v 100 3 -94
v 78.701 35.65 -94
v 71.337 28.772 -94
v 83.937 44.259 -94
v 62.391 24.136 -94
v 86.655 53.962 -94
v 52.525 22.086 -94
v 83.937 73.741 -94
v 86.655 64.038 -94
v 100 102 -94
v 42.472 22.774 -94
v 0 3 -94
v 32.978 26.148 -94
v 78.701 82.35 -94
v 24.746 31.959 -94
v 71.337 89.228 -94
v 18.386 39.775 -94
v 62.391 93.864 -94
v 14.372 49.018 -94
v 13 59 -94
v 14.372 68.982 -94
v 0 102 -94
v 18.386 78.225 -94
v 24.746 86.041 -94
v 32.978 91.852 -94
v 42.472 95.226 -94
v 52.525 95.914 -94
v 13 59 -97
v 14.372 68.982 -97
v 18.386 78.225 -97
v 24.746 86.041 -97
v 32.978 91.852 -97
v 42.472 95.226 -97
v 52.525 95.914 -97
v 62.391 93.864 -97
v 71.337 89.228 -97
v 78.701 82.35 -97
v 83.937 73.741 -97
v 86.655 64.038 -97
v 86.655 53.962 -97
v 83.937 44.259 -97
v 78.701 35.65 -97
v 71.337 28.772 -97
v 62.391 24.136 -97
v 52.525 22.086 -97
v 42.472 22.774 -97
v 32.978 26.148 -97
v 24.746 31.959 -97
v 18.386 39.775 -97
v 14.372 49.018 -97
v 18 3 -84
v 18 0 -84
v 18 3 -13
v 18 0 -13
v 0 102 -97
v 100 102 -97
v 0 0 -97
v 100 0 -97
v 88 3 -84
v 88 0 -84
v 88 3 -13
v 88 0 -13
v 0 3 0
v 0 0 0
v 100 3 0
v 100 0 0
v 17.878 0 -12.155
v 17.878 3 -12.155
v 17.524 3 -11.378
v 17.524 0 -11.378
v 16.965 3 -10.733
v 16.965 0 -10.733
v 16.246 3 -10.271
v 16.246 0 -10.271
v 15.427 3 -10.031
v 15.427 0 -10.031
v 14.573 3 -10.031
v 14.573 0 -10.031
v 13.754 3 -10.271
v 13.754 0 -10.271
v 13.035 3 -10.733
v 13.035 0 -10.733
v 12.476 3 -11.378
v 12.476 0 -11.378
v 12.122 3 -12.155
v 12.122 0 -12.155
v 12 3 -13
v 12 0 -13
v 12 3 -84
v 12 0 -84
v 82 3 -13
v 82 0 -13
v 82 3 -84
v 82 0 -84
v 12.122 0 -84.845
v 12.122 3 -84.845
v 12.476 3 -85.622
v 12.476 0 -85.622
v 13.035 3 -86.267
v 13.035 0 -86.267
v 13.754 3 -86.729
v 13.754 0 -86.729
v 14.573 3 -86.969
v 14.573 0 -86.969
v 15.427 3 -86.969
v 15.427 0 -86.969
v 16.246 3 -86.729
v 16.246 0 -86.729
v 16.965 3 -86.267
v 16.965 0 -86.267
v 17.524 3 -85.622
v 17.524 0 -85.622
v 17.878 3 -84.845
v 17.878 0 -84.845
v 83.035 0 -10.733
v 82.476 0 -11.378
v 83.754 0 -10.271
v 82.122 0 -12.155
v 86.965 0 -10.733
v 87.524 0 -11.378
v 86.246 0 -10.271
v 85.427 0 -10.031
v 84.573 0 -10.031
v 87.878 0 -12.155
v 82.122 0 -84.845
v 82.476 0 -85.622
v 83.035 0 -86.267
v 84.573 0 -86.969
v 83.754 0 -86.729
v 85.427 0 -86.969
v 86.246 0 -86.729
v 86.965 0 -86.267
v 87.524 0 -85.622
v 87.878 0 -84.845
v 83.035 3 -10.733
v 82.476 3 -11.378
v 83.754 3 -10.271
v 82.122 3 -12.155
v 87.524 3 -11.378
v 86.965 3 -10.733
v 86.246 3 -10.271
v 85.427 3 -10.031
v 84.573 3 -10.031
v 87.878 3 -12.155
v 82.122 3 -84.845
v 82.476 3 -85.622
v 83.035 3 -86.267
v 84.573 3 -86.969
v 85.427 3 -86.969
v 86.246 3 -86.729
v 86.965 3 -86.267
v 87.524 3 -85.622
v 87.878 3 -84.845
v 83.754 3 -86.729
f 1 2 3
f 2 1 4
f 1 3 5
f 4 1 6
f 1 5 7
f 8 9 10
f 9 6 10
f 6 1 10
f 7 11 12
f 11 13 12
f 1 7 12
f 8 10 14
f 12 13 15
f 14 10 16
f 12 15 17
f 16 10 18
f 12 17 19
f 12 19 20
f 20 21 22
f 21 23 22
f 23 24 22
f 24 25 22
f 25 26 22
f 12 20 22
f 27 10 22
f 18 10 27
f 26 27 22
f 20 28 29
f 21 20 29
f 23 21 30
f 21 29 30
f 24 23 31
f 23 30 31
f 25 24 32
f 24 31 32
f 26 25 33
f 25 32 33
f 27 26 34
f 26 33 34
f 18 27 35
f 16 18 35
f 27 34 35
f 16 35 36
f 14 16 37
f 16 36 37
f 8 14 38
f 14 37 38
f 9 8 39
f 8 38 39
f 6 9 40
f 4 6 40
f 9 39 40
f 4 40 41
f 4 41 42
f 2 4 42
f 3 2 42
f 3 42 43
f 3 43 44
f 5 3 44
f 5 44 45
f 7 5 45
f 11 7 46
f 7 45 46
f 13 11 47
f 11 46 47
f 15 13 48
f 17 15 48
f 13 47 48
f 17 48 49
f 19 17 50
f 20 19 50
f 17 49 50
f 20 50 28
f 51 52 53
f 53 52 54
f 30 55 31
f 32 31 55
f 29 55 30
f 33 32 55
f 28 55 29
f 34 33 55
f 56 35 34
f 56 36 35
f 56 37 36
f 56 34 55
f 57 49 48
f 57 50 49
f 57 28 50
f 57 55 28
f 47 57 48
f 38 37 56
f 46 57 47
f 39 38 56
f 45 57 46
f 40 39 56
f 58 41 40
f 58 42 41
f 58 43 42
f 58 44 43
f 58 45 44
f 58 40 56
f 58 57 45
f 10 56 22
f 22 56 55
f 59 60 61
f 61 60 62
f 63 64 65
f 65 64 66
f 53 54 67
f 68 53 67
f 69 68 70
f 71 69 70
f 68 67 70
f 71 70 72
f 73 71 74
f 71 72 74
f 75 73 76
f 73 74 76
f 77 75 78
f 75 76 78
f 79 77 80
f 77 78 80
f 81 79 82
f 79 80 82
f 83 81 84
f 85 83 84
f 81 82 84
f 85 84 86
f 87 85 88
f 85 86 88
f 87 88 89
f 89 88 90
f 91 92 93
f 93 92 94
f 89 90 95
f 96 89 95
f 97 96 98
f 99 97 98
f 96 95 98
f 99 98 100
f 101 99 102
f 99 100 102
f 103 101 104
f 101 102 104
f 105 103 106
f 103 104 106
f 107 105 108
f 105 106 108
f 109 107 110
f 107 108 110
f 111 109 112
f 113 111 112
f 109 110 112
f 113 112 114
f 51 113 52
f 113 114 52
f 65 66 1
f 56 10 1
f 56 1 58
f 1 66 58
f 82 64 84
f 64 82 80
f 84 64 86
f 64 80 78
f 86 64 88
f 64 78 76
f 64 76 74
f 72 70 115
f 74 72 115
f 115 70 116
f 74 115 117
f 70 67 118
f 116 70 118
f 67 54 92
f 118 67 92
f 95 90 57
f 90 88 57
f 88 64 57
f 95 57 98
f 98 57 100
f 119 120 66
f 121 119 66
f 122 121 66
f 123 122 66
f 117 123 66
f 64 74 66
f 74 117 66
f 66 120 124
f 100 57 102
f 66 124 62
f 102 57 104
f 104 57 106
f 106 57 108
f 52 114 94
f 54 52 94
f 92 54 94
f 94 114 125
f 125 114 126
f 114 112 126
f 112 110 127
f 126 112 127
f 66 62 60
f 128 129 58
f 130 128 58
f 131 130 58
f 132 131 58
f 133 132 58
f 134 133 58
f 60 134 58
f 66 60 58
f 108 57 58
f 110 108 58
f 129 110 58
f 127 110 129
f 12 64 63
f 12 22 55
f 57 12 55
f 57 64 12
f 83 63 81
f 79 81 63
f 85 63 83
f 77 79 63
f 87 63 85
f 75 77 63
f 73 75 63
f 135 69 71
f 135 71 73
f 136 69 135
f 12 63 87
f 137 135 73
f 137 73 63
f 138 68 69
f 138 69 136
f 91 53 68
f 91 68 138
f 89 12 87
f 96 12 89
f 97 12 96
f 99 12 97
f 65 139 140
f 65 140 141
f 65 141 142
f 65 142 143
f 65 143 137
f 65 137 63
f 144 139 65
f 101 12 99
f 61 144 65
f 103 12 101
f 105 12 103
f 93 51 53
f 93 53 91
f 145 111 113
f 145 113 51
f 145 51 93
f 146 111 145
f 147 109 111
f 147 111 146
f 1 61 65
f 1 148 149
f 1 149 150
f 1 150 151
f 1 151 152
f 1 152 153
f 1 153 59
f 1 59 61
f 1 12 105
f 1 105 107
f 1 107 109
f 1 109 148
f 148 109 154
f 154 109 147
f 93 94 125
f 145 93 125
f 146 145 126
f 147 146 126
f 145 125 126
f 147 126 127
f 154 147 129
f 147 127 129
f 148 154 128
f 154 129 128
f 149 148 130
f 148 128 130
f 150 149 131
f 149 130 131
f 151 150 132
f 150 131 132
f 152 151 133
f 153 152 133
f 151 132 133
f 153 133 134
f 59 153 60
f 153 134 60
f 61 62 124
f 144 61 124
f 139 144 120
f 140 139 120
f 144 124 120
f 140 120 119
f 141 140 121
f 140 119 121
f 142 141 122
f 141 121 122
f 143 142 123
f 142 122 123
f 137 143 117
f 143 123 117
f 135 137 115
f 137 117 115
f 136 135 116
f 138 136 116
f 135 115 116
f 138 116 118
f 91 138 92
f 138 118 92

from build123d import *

# Parameters (mm, degrees)
SKETCH1_W           = 100
SKETCH1_H           = 97
BOSS_EXTRUDE1_DEPTH = 3
SKETCH2_W           = 100
SKETCH2_H           = 102
SKETCH2_R           = 37
BOSS_EXTRUDE2_DEPTH = 3


with BuildPart() as part:
    # Sketch1 → Boss-Extrude1 (new body)
    with BuildSketch(Plane(origin=(0, 0, 0), x_dir=(1, 0, 0), z_dir=(0, 1, 0))):
        with Locations((50, 48.5)):
            Rectangle(SKETCH1_W, SKETCH1_H)
        with BuildLine():
            Line((18, 84), (18, 13))
            ThreePointArc((18, 13), (15, 10), (12, 13))
            Line((12, 13), (12, 84))
            ThreePointArc((12, 84), (15, 87), (18, 84))
        make_face(mode=Mode.SUBTRACT)
        with BuildLine():
            Line((82, 13), (82, 84))
            ThreePointArc((82, 84), (85, 87), (88, 84))
            Line((88, 84), (88, 13))
            ThreePointArc((88, 13), (85, 10), (82, 13))
        make_face(mode=Mode.SUBTRACT)
    extrude(amount=BOSS_EXTRUDE1_DEPTH)

    # Sketch2 → Boss-Extrude2 (add)
    with BuildSketch(Plane(origin=(0, 0, -97), x_dir=(-1, 0, 0), z_dir=(0, 0, -1))):
        with Locations((-50, 51)):
            Rectangle(SKETCH2_W, SKETCH2_H)
        with Locations((-50, 59)):
            Circle(SKETCH2_R, mode=Mode.SUBTRACT)
    extrude(amount=-BOSS_EXTRUDE2_DEPTH)


solid = part.part
